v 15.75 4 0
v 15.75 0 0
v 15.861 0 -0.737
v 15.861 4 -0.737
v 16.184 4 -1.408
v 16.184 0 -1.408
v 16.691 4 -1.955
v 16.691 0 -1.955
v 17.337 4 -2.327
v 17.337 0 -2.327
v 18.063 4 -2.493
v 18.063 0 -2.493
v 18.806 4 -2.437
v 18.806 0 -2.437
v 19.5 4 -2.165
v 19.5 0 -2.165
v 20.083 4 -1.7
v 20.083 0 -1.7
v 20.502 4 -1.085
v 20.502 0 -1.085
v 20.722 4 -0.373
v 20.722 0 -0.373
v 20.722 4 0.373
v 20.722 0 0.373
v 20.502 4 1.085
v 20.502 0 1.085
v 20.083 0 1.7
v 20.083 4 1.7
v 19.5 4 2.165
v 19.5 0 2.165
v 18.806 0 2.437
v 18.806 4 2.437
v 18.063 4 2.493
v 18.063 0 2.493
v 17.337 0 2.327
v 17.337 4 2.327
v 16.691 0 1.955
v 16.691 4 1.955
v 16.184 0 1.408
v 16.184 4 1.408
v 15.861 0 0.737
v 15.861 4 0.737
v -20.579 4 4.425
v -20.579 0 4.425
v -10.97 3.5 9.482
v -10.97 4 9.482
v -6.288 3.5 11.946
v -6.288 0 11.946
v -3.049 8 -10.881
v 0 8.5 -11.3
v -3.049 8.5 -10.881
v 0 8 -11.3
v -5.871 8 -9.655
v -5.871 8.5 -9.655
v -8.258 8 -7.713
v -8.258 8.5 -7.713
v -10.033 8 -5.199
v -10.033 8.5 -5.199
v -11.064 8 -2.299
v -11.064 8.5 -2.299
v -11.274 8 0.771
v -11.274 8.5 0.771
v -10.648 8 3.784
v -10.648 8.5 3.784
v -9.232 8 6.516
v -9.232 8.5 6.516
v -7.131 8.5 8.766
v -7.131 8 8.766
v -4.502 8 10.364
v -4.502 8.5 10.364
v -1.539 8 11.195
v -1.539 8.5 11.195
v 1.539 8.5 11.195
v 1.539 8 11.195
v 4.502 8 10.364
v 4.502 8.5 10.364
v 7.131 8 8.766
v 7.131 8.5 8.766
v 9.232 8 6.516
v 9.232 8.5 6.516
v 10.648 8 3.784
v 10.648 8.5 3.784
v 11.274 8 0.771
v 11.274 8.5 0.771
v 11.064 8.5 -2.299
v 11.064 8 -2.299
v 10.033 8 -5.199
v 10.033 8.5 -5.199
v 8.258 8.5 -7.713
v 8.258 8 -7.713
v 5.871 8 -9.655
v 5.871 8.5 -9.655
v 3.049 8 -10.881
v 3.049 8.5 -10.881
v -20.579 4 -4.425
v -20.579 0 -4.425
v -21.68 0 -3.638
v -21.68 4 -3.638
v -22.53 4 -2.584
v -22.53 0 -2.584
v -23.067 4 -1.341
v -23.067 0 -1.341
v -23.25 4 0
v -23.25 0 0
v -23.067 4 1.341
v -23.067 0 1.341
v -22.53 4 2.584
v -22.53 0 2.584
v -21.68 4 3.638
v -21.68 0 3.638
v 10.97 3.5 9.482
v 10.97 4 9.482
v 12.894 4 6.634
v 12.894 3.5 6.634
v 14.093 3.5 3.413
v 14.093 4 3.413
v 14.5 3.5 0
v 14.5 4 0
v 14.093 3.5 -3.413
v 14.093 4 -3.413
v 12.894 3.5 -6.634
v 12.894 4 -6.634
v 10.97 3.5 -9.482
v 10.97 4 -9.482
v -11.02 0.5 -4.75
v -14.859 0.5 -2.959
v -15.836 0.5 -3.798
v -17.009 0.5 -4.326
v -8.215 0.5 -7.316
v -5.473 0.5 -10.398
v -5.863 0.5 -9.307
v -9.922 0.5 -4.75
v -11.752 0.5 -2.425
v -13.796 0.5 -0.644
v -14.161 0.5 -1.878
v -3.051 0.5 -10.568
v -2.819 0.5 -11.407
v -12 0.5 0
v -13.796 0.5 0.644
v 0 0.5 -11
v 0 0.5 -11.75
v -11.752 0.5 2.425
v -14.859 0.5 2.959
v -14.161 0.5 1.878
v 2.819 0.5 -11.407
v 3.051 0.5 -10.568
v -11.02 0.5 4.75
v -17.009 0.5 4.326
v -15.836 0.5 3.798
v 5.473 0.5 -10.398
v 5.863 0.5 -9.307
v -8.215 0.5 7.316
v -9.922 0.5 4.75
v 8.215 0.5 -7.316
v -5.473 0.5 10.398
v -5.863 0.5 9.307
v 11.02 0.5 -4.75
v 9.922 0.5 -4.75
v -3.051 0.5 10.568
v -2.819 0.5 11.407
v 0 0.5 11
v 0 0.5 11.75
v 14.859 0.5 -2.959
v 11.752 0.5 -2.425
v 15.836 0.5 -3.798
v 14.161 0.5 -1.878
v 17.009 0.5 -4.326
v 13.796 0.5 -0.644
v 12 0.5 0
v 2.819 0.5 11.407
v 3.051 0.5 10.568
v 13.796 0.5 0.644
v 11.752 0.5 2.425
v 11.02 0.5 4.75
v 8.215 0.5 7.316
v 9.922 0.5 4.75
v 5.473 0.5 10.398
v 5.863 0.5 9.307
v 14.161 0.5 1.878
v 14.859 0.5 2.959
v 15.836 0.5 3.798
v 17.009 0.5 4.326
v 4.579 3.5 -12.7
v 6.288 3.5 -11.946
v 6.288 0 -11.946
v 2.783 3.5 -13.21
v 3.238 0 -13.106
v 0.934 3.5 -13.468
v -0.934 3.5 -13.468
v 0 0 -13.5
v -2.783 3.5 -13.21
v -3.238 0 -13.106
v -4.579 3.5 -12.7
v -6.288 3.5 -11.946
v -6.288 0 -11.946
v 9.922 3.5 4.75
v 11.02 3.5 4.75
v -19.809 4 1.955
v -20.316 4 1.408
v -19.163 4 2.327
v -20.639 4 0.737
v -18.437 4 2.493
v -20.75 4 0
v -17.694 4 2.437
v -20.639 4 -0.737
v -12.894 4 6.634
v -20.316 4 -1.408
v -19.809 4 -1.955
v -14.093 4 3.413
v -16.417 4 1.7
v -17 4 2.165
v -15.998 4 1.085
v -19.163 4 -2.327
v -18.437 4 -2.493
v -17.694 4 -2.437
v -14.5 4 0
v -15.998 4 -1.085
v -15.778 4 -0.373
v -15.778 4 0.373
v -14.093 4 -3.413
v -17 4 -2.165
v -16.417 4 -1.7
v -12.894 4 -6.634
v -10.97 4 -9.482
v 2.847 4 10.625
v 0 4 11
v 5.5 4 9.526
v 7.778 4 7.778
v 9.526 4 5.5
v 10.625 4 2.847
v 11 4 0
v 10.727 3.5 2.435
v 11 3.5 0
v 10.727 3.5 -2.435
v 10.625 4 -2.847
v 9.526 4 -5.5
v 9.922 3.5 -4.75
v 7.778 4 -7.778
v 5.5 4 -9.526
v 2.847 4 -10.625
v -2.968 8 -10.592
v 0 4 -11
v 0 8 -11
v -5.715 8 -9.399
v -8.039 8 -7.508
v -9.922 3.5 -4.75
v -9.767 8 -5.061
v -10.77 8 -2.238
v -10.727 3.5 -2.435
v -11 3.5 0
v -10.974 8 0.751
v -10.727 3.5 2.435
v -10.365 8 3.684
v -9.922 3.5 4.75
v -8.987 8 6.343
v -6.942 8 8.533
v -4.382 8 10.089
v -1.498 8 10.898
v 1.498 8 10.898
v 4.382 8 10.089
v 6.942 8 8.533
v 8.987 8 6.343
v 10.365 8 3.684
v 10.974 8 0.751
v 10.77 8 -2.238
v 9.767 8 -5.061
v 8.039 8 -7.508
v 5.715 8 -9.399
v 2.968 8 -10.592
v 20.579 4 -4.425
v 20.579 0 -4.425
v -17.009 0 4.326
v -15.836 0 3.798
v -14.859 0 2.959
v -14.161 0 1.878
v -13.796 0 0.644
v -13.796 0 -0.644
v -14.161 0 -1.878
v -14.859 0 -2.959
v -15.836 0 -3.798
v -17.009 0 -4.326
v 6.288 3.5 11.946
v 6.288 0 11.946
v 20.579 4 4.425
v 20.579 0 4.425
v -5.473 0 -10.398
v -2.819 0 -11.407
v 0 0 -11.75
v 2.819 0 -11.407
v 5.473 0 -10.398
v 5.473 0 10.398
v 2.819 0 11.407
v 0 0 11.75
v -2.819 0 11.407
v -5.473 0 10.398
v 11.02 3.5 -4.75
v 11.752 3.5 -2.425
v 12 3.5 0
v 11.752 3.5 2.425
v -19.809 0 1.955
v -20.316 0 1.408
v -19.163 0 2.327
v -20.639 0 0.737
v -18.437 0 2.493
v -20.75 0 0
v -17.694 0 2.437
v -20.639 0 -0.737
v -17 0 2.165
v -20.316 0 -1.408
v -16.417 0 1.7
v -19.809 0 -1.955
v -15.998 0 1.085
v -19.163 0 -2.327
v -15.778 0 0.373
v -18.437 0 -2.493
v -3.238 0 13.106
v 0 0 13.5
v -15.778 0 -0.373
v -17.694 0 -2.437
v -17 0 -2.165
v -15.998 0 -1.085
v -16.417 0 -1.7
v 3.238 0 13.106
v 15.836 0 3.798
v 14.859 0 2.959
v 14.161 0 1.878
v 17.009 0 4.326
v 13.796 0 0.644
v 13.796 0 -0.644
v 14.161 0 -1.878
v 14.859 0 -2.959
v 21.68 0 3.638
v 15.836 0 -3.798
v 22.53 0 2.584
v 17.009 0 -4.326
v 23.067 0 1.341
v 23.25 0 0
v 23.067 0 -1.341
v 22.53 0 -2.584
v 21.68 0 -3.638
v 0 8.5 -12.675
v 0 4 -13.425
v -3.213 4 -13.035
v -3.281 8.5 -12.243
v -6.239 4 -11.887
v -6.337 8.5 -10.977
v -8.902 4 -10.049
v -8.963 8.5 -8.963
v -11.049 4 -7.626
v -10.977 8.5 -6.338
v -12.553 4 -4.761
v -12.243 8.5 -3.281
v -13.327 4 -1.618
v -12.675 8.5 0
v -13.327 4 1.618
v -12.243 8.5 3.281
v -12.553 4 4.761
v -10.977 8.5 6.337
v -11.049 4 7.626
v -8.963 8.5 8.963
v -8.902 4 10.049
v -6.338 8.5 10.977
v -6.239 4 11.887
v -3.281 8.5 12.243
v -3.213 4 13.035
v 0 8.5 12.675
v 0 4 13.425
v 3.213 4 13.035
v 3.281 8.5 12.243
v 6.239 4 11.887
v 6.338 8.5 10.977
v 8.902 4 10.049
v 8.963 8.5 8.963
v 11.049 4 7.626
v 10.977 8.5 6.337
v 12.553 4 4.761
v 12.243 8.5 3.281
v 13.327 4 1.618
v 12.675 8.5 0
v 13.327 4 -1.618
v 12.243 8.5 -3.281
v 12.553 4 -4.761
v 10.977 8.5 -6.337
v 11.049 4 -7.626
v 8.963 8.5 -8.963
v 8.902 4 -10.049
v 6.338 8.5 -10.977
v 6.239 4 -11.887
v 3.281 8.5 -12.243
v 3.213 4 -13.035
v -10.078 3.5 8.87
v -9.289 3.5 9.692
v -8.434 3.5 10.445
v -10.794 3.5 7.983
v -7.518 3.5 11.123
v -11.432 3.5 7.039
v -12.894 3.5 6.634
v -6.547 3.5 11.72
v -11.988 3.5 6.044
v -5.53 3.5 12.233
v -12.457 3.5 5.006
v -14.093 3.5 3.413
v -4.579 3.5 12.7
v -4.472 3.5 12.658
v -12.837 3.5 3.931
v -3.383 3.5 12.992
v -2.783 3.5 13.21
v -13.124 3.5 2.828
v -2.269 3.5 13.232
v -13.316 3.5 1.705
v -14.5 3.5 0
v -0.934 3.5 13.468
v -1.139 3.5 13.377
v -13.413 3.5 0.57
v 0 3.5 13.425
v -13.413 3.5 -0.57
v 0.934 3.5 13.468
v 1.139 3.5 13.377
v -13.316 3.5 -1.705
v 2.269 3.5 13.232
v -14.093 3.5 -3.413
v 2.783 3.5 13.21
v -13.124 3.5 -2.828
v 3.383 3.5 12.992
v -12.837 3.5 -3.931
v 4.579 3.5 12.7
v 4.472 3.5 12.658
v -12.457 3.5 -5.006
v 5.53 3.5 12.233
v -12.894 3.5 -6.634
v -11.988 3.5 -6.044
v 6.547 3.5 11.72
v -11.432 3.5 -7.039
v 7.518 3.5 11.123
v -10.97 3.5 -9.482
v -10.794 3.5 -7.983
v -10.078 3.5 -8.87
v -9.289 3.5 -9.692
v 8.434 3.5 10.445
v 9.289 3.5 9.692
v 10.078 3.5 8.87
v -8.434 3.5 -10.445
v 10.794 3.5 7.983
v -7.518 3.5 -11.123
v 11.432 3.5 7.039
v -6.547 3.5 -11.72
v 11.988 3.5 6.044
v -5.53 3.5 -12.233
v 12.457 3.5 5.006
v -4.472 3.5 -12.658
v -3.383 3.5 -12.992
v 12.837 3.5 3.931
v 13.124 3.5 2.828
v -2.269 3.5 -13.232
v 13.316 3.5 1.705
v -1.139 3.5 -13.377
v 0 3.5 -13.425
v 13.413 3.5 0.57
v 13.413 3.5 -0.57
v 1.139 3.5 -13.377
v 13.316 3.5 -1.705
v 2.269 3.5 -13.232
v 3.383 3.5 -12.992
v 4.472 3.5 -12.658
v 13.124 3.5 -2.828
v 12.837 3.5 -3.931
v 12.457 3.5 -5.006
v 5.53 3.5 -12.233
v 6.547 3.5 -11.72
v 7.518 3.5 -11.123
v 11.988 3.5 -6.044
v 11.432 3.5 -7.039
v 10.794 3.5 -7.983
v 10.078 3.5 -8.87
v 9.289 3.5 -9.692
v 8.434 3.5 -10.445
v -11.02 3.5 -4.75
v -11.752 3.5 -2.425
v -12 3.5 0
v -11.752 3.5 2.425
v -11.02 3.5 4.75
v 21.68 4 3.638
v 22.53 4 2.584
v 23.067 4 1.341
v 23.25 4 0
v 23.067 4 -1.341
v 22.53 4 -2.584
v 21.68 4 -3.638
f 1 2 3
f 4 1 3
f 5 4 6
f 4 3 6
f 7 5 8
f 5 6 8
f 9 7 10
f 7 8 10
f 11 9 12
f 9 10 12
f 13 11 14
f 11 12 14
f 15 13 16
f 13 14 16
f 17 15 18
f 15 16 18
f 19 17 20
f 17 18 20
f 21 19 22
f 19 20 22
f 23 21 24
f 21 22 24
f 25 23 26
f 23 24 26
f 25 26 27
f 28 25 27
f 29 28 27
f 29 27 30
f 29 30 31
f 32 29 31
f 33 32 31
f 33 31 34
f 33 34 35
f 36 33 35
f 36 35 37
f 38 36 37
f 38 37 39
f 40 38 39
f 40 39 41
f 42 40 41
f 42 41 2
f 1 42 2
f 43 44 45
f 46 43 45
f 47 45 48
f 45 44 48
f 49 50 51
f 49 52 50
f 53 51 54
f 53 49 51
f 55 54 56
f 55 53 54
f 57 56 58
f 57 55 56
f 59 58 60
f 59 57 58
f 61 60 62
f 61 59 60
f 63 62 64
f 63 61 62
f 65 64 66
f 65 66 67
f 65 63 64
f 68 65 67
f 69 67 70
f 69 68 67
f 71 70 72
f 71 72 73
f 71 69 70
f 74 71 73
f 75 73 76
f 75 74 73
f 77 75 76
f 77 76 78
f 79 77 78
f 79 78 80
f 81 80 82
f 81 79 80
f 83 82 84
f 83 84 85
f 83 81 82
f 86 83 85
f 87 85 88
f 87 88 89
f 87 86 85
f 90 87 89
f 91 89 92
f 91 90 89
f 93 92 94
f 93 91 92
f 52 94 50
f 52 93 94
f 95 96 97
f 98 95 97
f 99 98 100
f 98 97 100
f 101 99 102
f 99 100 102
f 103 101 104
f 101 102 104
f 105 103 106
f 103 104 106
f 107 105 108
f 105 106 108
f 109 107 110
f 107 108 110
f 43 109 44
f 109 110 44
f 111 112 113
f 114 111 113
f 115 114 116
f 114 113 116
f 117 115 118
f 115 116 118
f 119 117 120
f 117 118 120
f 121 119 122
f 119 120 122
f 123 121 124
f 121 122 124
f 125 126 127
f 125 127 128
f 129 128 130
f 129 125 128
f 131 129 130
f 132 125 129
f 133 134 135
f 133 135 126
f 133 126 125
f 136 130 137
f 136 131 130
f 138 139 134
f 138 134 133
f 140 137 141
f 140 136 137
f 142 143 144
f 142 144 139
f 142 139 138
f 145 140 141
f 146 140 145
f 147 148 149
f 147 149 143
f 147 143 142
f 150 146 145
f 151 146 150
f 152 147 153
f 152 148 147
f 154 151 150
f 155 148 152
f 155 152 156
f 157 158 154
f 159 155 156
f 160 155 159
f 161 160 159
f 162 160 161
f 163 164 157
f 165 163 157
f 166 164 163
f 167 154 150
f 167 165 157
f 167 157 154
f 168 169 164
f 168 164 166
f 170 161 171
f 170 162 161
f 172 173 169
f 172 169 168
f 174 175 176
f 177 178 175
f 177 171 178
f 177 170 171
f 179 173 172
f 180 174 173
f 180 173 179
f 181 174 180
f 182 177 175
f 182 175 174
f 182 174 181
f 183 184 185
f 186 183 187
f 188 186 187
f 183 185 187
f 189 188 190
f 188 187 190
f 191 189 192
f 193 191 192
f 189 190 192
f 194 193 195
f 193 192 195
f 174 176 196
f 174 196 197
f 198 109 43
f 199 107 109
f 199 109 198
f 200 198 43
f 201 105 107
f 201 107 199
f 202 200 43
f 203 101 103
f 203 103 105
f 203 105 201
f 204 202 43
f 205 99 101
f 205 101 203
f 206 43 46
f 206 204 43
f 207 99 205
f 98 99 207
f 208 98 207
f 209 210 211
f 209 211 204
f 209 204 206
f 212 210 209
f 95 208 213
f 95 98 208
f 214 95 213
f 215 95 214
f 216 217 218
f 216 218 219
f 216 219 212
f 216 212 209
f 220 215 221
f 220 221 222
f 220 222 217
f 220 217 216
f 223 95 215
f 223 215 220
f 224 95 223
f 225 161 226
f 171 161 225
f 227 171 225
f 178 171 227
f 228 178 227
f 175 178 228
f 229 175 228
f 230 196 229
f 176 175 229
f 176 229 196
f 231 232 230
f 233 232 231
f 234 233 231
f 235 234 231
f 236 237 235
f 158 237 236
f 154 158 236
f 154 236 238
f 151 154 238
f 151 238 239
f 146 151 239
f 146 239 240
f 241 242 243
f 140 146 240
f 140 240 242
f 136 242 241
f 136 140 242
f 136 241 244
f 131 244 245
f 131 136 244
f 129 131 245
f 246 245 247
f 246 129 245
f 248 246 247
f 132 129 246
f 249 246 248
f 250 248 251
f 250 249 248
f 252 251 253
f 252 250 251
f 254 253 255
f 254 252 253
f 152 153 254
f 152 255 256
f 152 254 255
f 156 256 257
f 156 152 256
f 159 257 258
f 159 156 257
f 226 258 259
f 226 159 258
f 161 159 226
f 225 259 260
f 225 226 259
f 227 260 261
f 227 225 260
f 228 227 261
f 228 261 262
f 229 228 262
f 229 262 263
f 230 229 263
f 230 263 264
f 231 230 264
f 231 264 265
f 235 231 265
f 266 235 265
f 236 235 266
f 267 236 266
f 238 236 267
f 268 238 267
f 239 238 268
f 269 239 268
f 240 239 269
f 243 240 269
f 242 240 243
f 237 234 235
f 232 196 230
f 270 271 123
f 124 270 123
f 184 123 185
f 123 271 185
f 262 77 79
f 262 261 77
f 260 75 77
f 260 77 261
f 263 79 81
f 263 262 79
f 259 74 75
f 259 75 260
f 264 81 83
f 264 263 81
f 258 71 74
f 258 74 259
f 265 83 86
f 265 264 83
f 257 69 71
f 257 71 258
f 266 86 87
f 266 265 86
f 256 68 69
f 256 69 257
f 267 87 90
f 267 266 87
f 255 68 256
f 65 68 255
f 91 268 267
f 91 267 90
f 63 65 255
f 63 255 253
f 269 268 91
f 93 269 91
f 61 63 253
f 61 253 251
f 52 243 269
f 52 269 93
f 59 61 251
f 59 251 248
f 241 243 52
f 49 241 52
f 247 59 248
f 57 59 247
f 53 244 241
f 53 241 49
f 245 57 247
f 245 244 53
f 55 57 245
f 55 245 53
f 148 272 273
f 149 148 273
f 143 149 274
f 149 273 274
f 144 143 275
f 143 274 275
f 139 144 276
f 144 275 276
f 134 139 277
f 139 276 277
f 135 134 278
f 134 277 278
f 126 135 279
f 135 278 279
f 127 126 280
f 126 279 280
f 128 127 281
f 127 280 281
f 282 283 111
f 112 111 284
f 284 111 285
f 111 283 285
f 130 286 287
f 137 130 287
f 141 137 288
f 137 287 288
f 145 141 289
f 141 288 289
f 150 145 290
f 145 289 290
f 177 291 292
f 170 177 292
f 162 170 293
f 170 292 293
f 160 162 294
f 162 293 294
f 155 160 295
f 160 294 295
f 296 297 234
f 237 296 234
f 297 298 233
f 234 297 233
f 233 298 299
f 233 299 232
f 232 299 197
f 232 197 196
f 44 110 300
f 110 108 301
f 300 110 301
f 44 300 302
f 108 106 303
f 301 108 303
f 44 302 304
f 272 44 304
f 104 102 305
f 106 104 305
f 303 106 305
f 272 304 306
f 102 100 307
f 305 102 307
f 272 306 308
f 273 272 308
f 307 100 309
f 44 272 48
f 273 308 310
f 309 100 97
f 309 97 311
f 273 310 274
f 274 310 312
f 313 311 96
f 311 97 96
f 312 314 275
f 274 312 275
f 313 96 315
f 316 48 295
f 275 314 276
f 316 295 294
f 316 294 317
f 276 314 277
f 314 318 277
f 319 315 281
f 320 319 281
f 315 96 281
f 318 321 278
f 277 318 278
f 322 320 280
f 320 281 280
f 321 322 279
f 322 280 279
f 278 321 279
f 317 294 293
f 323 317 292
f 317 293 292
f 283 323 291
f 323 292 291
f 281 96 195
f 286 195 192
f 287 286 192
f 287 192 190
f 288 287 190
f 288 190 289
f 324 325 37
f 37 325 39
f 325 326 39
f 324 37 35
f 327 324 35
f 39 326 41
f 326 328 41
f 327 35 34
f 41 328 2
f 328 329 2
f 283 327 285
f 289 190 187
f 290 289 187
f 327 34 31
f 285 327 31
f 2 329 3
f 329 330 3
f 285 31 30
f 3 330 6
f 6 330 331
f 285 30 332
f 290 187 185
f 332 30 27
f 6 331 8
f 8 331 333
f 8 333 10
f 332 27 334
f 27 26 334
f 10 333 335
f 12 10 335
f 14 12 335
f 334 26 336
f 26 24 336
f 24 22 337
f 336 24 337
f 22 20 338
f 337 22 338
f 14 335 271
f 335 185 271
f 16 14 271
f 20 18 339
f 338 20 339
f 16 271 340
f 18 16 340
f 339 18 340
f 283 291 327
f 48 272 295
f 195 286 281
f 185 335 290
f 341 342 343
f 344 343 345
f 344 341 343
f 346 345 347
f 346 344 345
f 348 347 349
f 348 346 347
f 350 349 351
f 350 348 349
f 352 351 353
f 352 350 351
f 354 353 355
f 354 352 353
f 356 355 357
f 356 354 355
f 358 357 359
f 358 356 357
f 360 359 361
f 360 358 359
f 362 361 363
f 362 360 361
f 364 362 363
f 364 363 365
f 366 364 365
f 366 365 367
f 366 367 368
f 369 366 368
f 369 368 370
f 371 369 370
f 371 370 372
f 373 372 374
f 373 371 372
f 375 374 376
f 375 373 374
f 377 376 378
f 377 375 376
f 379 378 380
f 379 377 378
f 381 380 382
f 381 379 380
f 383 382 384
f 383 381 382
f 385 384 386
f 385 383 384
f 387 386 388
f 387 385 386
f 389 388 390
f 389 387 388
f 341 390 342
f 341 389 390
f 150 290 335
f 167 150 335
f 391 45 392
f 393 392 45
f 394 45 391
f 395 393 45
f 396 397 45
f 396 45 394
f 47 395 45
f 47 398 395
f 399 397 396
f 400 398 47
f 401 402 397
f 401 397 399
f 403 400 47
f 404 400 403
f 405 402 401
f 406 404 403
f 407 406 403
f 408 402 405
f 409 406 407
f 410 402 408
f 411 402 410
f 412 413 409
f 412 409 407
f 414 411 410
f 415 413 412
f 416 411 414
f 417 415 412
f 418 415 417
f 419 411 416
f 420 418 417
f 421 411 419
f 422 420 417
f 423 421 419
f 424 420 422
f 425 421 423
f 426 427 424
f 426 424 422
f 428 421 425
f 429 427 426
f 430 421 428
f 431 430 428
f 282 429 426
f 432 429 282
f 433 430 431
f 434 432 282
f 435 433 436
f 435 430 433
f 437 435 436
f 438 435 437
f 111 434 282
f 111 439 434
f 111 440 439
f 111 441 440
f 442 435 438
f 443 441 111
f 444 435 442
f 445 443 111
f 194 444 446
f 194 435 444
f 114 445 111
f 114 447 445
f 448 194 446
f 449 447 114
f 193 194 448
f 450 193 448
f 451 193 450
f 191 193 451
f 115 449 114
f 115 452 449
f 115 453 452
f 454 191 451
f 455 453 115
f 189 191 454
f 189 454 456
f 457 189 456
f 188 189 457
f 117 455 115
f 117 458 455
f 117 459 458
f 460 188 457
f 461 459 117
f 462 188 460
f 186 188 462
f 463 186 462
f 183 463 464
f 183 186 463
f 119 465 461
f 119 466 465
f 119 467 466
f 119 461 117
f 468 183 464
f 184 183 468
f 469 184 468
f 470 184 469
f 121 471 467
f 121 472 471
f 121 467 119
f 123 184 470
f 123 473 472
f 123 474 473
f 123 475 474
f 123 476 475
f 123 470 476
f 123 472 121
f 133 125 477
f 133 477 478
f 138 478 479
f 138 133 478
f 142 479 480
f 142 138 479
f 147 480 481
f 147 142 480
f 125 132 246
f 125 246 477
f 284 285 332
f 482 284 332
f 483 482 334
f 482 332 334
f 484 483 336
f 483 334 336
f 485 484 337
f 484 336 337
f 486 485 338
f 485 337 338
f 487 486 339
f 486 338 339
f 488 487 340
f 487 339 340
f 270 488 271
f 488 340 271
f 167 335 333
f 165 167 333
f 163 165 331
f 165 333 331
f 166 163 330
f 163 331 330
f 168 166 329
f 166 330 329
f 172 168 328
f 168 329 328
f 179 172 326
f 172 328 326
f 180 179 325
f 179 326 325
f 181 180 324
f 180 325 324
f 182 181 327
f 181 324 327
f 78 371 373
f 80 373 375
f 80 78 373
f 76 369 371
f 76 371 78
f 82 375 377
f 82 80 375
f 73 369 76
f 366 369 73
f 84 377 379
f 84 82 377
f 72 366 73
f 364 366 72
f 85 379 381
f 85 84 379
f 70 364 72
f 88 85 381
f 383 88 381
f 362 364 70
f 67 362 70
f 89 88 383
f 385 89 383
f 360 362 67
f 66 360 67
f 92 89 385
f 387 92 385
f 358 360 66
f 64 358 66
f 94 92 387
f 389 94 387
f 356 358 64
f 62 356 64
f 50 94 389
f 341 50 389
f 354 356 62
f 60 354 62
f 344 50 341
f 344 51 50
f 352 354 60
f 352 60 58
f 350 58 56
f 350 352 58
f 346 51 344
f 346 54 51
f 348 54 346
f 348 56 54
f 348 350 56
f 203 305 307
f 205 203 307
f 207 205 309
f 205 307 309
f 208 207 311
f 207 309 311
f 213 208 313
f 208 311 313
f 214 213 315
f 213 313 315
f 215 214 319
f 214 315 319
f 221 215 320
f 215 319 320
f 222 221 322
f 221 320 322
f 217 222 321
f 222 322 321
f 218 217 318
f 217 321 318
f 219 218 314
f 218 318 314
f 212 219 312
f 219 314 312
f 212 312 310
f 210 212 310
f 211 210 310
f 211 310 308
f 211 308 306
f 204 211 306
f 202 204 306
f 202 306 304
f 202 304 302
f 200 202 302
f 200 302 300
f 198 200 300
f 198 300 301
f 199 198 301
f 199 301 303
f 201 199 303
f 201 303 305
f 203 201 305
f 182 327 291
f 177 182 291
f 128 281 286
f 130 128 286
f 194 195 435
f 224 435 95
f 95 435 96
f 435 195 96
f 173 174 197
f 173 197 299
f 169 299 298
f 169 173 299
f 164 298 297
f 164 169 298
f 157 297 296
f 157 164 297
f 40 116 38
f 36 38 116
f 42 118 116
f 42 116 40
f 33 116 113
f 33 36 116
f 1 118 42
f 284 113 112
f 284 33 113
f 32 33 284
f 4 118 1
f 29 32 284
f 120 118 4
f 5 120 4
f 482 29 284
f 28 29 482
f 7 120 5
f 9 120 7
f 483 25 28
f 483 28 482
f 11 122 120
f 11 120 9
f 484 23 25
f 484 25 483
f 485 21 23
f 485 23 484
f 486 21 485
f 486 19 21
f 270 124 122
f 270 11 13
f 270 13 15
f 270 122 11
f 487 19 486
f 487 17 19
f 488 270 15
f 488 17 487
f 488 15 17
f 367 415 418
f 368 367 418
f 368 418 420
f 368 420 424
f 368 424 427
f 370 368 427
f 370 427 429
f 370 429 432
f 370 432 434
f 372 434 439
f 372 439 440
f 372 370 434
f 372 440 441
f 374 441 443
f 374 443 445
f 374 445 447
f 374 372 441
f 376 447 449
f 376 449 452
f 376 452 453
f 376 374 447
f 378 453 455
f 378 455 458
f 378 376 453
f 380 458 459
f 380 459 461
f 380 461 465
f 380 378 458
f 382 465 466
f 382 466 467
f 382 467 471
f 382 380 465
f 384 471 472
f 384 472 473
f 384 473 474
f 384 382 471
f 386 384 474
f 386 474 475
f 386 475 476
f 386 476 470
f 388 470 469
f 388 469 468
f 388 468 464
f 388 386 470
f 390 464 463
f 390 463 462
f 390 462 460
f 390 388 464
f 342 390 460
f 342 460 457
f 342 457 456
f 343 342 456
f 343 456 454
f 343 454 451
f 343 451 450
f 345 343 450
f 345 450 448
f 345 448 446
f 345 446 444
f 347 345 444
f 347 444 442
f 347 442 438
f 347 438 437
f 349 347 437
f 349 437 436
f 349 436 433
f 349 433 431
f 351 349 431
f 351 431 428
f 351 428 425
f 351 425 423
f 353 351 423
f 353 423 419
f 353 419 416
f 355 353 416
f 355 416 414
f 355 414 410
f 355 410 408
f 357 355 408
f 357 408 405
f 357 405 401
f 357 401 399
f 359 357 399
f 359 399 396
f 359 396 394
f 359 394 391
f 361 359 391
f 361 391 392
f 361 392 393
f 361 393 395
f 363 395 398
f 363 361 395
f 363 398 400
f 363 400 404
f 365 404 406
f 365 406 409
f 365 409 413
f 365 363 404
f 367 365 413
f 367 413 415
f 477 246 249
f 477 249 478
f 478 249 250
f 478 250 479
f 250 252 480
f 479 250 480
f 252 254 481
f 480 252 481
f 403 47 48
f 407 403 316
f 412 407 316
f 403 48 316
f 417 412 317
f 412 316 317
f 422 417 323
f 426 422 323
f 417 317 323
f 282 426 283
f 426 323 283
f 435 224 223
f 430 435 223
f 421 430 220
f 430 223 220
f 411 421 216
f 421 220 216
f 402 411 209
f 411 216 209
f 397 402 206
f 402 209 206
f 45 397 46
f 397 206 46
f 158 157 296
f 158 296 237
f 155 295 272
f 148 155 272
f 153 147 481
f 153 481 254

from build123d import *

# Parameters (mm, degrees)
SKETCH1_R              = 11
FLANGE_DEPTH           = 4
SKETCH3_R              = 13.425
TOP_RECESS_DEPTH       = 0.5
BOTTOM_RECESS_1_DEPTH  = 0.5
BOTTOM_RECESS_2_DEPTH  = 3
MOUNTING_HOLE_M5X0_8_D = 5


with BuildPart() as part:
    # Sketch1 → Flange (new body)
    with BuildSketch(Plane(origin=(0, 0, 0), x_dir=(1, 0, 0), z_dir=(0, 1, 0))):
        with BuildLine():
            Line((20.578767123, 4.424572712), (6.287671233, 11.946346323))
            ThreePointArc((6.287671233, 11.946346323), (0, 13.5), (-6.287671233, 11.946346323))
            Line((-6.287671233, 11.946346323), (-20.578767123, 4.424572712))
            ThreePointArc((-20.578767123, 4.424572712), (-23.25, 0), (-20.578767123, -4.424572712))
            Line((-20.578767123, -4.424572712), (-6.287671233, -11.946346323))
            ThreePointArc((-6.287671233, -11.946346323), (0, -13.5), (6.287671233, -11.946346323))
            Line((6.287671233, -11.946346323), (20.578767123, -4.424572712))
            ThreePointArc((20.578767123, -4.424572712), (23.25, 0), (20.578767123, 4.424572712))
        make_face()
        with Locations(Location((0, 0, 0), (0, 0, 270))):
            Circle(SKETCH1_R, mode=Mode.SUBTRACT)
    extrude(amount=FLANGE_DEPTH)

    # Sketch2 → Bearing Seat (revolve)
    with BuildSketch(Plane.XY, mode=Mode.PRIVATE) as bearing_seat_sk:
        Polygon((-13.425, 4), (-12.675, 8.5), (-11.3, 8.5), (-11.3, 8), (-11, 8), (-11, 4), align=None)
    revolve(bearing_seat_sk.sketch.rotate(Axis((0, 0, 0), (0, 1, 0)), 270), axis=Axis((0, 0, 0), (0, 1, 0)))

    # Sketch3 → Top Recess (cut)
    with BuildSketch(Plane(origin=(0, 4, 0), x_dir=(1, 0, 0), z_dir=(0, 1, 0))):
        with BuildLine():
            Line((10.970198855, 9.481810855), (6.287671233, 11.946346323))
            ThreePointArc((6.287671233, 11.946346323), (0, 13.5), (-6.287671233, 11.946346323))
            Line((-6.287671233, 11.946346323), (-10.970198855, 9.481810855))
            ThreePointArc((-10.970198855, 9.481810855), (-14.5, 0), (-10.970198855, -9.481810855))
            Line((-10.970198855, -9.481810855), (-6.287671233, -11.946346323))
            ThreePointArc((-6.287671233, -11.946346323), (0, -13.5), (6.287671233, -11.946346323))
            Line((6.287671233, -11.946346323), (10.970198855, -9.481810855))
            ThreePointArc((10.970198855, -9.481810855), (14.5, 0), (10.970198855, 9.481810855))
        make_face()
        with Locations(Location((0, 0, 0), (0, 0, 270))):
            Circle(SKETCH3_R, mode=Mode.SUBTRACT)
    extrude(amount=-TOP_RECESS_DEPTH, mode=Mode.SUBTRACT)

    # Sketch5 → Bottom Recess 1 (cut)
    with BuildSketch(Plane.XZ):
        with BuildLine():
            Line((17.009424329, 4.325618107), (5.47260274, 10.397745874))
            ThreePointArc((5.47260274, 10.397745874), (0, 11.75), (-5.47260274, 10.397745874))
            Line((-5.47260274, 10.397745874), (-17.009424329, 4.325618107))
            ThreePointArc((-17.009424329, 4.325618107), (-13.75, 0), (-17.009424329, -4.325618107))
            Line((-17.009424329, -4.325618107), (-5.47260274, -10.397745874))
            ThreePointArc((-5.47260274, -10.397745874), (0, -11.75), (5.47260274, -10.397745874))
            Line((5.47260274, -10.397745874), (17.009424329, -4.325618107))
            ThreePointArc((17.009424329, -4.325618107), (13.75, 0), (17.009424329, 4.325618107))
        make_face()
    extrude(amount=-BOTTOM_RECESS_1_DEPTH, mode=Mode.SUBTRACT)

    # Sketch6 → Bottom Recess 2 (cut)
    with BuildSketch(Plane.XZ.offset(-0.5)):
        with BuildLine():
            Line((-11.01986842, 4.75), (11.01986842, 4.75))
            ThreePointArc((11.01986842, 4.75), (12, 0), (11.01986842, -4.75))
            Line((11.01986842, -4.75), (-11.01986842, -4.75))
            ThreePointArc((-11.01986842, -4.75), (-12, 0), (-11.01986842, 4.75))
        make_face()
    extrude(amount=-BOTTOM_RECESS_2_DEPTH, mode=Mode.SUBTRACT)

    # Mounting Hole (M5x0.8) (through all)
    with Locations(Plane(origin=(0, 4, 0), x_dir=(1, 0, 0), z_dir=(0, 1, 0))):
        with Locations((18.25, 0), (-18.25, 0)):
            Hole(MOUNTING_HOLE_M5X0_8_D / 2)


solid = part.part
